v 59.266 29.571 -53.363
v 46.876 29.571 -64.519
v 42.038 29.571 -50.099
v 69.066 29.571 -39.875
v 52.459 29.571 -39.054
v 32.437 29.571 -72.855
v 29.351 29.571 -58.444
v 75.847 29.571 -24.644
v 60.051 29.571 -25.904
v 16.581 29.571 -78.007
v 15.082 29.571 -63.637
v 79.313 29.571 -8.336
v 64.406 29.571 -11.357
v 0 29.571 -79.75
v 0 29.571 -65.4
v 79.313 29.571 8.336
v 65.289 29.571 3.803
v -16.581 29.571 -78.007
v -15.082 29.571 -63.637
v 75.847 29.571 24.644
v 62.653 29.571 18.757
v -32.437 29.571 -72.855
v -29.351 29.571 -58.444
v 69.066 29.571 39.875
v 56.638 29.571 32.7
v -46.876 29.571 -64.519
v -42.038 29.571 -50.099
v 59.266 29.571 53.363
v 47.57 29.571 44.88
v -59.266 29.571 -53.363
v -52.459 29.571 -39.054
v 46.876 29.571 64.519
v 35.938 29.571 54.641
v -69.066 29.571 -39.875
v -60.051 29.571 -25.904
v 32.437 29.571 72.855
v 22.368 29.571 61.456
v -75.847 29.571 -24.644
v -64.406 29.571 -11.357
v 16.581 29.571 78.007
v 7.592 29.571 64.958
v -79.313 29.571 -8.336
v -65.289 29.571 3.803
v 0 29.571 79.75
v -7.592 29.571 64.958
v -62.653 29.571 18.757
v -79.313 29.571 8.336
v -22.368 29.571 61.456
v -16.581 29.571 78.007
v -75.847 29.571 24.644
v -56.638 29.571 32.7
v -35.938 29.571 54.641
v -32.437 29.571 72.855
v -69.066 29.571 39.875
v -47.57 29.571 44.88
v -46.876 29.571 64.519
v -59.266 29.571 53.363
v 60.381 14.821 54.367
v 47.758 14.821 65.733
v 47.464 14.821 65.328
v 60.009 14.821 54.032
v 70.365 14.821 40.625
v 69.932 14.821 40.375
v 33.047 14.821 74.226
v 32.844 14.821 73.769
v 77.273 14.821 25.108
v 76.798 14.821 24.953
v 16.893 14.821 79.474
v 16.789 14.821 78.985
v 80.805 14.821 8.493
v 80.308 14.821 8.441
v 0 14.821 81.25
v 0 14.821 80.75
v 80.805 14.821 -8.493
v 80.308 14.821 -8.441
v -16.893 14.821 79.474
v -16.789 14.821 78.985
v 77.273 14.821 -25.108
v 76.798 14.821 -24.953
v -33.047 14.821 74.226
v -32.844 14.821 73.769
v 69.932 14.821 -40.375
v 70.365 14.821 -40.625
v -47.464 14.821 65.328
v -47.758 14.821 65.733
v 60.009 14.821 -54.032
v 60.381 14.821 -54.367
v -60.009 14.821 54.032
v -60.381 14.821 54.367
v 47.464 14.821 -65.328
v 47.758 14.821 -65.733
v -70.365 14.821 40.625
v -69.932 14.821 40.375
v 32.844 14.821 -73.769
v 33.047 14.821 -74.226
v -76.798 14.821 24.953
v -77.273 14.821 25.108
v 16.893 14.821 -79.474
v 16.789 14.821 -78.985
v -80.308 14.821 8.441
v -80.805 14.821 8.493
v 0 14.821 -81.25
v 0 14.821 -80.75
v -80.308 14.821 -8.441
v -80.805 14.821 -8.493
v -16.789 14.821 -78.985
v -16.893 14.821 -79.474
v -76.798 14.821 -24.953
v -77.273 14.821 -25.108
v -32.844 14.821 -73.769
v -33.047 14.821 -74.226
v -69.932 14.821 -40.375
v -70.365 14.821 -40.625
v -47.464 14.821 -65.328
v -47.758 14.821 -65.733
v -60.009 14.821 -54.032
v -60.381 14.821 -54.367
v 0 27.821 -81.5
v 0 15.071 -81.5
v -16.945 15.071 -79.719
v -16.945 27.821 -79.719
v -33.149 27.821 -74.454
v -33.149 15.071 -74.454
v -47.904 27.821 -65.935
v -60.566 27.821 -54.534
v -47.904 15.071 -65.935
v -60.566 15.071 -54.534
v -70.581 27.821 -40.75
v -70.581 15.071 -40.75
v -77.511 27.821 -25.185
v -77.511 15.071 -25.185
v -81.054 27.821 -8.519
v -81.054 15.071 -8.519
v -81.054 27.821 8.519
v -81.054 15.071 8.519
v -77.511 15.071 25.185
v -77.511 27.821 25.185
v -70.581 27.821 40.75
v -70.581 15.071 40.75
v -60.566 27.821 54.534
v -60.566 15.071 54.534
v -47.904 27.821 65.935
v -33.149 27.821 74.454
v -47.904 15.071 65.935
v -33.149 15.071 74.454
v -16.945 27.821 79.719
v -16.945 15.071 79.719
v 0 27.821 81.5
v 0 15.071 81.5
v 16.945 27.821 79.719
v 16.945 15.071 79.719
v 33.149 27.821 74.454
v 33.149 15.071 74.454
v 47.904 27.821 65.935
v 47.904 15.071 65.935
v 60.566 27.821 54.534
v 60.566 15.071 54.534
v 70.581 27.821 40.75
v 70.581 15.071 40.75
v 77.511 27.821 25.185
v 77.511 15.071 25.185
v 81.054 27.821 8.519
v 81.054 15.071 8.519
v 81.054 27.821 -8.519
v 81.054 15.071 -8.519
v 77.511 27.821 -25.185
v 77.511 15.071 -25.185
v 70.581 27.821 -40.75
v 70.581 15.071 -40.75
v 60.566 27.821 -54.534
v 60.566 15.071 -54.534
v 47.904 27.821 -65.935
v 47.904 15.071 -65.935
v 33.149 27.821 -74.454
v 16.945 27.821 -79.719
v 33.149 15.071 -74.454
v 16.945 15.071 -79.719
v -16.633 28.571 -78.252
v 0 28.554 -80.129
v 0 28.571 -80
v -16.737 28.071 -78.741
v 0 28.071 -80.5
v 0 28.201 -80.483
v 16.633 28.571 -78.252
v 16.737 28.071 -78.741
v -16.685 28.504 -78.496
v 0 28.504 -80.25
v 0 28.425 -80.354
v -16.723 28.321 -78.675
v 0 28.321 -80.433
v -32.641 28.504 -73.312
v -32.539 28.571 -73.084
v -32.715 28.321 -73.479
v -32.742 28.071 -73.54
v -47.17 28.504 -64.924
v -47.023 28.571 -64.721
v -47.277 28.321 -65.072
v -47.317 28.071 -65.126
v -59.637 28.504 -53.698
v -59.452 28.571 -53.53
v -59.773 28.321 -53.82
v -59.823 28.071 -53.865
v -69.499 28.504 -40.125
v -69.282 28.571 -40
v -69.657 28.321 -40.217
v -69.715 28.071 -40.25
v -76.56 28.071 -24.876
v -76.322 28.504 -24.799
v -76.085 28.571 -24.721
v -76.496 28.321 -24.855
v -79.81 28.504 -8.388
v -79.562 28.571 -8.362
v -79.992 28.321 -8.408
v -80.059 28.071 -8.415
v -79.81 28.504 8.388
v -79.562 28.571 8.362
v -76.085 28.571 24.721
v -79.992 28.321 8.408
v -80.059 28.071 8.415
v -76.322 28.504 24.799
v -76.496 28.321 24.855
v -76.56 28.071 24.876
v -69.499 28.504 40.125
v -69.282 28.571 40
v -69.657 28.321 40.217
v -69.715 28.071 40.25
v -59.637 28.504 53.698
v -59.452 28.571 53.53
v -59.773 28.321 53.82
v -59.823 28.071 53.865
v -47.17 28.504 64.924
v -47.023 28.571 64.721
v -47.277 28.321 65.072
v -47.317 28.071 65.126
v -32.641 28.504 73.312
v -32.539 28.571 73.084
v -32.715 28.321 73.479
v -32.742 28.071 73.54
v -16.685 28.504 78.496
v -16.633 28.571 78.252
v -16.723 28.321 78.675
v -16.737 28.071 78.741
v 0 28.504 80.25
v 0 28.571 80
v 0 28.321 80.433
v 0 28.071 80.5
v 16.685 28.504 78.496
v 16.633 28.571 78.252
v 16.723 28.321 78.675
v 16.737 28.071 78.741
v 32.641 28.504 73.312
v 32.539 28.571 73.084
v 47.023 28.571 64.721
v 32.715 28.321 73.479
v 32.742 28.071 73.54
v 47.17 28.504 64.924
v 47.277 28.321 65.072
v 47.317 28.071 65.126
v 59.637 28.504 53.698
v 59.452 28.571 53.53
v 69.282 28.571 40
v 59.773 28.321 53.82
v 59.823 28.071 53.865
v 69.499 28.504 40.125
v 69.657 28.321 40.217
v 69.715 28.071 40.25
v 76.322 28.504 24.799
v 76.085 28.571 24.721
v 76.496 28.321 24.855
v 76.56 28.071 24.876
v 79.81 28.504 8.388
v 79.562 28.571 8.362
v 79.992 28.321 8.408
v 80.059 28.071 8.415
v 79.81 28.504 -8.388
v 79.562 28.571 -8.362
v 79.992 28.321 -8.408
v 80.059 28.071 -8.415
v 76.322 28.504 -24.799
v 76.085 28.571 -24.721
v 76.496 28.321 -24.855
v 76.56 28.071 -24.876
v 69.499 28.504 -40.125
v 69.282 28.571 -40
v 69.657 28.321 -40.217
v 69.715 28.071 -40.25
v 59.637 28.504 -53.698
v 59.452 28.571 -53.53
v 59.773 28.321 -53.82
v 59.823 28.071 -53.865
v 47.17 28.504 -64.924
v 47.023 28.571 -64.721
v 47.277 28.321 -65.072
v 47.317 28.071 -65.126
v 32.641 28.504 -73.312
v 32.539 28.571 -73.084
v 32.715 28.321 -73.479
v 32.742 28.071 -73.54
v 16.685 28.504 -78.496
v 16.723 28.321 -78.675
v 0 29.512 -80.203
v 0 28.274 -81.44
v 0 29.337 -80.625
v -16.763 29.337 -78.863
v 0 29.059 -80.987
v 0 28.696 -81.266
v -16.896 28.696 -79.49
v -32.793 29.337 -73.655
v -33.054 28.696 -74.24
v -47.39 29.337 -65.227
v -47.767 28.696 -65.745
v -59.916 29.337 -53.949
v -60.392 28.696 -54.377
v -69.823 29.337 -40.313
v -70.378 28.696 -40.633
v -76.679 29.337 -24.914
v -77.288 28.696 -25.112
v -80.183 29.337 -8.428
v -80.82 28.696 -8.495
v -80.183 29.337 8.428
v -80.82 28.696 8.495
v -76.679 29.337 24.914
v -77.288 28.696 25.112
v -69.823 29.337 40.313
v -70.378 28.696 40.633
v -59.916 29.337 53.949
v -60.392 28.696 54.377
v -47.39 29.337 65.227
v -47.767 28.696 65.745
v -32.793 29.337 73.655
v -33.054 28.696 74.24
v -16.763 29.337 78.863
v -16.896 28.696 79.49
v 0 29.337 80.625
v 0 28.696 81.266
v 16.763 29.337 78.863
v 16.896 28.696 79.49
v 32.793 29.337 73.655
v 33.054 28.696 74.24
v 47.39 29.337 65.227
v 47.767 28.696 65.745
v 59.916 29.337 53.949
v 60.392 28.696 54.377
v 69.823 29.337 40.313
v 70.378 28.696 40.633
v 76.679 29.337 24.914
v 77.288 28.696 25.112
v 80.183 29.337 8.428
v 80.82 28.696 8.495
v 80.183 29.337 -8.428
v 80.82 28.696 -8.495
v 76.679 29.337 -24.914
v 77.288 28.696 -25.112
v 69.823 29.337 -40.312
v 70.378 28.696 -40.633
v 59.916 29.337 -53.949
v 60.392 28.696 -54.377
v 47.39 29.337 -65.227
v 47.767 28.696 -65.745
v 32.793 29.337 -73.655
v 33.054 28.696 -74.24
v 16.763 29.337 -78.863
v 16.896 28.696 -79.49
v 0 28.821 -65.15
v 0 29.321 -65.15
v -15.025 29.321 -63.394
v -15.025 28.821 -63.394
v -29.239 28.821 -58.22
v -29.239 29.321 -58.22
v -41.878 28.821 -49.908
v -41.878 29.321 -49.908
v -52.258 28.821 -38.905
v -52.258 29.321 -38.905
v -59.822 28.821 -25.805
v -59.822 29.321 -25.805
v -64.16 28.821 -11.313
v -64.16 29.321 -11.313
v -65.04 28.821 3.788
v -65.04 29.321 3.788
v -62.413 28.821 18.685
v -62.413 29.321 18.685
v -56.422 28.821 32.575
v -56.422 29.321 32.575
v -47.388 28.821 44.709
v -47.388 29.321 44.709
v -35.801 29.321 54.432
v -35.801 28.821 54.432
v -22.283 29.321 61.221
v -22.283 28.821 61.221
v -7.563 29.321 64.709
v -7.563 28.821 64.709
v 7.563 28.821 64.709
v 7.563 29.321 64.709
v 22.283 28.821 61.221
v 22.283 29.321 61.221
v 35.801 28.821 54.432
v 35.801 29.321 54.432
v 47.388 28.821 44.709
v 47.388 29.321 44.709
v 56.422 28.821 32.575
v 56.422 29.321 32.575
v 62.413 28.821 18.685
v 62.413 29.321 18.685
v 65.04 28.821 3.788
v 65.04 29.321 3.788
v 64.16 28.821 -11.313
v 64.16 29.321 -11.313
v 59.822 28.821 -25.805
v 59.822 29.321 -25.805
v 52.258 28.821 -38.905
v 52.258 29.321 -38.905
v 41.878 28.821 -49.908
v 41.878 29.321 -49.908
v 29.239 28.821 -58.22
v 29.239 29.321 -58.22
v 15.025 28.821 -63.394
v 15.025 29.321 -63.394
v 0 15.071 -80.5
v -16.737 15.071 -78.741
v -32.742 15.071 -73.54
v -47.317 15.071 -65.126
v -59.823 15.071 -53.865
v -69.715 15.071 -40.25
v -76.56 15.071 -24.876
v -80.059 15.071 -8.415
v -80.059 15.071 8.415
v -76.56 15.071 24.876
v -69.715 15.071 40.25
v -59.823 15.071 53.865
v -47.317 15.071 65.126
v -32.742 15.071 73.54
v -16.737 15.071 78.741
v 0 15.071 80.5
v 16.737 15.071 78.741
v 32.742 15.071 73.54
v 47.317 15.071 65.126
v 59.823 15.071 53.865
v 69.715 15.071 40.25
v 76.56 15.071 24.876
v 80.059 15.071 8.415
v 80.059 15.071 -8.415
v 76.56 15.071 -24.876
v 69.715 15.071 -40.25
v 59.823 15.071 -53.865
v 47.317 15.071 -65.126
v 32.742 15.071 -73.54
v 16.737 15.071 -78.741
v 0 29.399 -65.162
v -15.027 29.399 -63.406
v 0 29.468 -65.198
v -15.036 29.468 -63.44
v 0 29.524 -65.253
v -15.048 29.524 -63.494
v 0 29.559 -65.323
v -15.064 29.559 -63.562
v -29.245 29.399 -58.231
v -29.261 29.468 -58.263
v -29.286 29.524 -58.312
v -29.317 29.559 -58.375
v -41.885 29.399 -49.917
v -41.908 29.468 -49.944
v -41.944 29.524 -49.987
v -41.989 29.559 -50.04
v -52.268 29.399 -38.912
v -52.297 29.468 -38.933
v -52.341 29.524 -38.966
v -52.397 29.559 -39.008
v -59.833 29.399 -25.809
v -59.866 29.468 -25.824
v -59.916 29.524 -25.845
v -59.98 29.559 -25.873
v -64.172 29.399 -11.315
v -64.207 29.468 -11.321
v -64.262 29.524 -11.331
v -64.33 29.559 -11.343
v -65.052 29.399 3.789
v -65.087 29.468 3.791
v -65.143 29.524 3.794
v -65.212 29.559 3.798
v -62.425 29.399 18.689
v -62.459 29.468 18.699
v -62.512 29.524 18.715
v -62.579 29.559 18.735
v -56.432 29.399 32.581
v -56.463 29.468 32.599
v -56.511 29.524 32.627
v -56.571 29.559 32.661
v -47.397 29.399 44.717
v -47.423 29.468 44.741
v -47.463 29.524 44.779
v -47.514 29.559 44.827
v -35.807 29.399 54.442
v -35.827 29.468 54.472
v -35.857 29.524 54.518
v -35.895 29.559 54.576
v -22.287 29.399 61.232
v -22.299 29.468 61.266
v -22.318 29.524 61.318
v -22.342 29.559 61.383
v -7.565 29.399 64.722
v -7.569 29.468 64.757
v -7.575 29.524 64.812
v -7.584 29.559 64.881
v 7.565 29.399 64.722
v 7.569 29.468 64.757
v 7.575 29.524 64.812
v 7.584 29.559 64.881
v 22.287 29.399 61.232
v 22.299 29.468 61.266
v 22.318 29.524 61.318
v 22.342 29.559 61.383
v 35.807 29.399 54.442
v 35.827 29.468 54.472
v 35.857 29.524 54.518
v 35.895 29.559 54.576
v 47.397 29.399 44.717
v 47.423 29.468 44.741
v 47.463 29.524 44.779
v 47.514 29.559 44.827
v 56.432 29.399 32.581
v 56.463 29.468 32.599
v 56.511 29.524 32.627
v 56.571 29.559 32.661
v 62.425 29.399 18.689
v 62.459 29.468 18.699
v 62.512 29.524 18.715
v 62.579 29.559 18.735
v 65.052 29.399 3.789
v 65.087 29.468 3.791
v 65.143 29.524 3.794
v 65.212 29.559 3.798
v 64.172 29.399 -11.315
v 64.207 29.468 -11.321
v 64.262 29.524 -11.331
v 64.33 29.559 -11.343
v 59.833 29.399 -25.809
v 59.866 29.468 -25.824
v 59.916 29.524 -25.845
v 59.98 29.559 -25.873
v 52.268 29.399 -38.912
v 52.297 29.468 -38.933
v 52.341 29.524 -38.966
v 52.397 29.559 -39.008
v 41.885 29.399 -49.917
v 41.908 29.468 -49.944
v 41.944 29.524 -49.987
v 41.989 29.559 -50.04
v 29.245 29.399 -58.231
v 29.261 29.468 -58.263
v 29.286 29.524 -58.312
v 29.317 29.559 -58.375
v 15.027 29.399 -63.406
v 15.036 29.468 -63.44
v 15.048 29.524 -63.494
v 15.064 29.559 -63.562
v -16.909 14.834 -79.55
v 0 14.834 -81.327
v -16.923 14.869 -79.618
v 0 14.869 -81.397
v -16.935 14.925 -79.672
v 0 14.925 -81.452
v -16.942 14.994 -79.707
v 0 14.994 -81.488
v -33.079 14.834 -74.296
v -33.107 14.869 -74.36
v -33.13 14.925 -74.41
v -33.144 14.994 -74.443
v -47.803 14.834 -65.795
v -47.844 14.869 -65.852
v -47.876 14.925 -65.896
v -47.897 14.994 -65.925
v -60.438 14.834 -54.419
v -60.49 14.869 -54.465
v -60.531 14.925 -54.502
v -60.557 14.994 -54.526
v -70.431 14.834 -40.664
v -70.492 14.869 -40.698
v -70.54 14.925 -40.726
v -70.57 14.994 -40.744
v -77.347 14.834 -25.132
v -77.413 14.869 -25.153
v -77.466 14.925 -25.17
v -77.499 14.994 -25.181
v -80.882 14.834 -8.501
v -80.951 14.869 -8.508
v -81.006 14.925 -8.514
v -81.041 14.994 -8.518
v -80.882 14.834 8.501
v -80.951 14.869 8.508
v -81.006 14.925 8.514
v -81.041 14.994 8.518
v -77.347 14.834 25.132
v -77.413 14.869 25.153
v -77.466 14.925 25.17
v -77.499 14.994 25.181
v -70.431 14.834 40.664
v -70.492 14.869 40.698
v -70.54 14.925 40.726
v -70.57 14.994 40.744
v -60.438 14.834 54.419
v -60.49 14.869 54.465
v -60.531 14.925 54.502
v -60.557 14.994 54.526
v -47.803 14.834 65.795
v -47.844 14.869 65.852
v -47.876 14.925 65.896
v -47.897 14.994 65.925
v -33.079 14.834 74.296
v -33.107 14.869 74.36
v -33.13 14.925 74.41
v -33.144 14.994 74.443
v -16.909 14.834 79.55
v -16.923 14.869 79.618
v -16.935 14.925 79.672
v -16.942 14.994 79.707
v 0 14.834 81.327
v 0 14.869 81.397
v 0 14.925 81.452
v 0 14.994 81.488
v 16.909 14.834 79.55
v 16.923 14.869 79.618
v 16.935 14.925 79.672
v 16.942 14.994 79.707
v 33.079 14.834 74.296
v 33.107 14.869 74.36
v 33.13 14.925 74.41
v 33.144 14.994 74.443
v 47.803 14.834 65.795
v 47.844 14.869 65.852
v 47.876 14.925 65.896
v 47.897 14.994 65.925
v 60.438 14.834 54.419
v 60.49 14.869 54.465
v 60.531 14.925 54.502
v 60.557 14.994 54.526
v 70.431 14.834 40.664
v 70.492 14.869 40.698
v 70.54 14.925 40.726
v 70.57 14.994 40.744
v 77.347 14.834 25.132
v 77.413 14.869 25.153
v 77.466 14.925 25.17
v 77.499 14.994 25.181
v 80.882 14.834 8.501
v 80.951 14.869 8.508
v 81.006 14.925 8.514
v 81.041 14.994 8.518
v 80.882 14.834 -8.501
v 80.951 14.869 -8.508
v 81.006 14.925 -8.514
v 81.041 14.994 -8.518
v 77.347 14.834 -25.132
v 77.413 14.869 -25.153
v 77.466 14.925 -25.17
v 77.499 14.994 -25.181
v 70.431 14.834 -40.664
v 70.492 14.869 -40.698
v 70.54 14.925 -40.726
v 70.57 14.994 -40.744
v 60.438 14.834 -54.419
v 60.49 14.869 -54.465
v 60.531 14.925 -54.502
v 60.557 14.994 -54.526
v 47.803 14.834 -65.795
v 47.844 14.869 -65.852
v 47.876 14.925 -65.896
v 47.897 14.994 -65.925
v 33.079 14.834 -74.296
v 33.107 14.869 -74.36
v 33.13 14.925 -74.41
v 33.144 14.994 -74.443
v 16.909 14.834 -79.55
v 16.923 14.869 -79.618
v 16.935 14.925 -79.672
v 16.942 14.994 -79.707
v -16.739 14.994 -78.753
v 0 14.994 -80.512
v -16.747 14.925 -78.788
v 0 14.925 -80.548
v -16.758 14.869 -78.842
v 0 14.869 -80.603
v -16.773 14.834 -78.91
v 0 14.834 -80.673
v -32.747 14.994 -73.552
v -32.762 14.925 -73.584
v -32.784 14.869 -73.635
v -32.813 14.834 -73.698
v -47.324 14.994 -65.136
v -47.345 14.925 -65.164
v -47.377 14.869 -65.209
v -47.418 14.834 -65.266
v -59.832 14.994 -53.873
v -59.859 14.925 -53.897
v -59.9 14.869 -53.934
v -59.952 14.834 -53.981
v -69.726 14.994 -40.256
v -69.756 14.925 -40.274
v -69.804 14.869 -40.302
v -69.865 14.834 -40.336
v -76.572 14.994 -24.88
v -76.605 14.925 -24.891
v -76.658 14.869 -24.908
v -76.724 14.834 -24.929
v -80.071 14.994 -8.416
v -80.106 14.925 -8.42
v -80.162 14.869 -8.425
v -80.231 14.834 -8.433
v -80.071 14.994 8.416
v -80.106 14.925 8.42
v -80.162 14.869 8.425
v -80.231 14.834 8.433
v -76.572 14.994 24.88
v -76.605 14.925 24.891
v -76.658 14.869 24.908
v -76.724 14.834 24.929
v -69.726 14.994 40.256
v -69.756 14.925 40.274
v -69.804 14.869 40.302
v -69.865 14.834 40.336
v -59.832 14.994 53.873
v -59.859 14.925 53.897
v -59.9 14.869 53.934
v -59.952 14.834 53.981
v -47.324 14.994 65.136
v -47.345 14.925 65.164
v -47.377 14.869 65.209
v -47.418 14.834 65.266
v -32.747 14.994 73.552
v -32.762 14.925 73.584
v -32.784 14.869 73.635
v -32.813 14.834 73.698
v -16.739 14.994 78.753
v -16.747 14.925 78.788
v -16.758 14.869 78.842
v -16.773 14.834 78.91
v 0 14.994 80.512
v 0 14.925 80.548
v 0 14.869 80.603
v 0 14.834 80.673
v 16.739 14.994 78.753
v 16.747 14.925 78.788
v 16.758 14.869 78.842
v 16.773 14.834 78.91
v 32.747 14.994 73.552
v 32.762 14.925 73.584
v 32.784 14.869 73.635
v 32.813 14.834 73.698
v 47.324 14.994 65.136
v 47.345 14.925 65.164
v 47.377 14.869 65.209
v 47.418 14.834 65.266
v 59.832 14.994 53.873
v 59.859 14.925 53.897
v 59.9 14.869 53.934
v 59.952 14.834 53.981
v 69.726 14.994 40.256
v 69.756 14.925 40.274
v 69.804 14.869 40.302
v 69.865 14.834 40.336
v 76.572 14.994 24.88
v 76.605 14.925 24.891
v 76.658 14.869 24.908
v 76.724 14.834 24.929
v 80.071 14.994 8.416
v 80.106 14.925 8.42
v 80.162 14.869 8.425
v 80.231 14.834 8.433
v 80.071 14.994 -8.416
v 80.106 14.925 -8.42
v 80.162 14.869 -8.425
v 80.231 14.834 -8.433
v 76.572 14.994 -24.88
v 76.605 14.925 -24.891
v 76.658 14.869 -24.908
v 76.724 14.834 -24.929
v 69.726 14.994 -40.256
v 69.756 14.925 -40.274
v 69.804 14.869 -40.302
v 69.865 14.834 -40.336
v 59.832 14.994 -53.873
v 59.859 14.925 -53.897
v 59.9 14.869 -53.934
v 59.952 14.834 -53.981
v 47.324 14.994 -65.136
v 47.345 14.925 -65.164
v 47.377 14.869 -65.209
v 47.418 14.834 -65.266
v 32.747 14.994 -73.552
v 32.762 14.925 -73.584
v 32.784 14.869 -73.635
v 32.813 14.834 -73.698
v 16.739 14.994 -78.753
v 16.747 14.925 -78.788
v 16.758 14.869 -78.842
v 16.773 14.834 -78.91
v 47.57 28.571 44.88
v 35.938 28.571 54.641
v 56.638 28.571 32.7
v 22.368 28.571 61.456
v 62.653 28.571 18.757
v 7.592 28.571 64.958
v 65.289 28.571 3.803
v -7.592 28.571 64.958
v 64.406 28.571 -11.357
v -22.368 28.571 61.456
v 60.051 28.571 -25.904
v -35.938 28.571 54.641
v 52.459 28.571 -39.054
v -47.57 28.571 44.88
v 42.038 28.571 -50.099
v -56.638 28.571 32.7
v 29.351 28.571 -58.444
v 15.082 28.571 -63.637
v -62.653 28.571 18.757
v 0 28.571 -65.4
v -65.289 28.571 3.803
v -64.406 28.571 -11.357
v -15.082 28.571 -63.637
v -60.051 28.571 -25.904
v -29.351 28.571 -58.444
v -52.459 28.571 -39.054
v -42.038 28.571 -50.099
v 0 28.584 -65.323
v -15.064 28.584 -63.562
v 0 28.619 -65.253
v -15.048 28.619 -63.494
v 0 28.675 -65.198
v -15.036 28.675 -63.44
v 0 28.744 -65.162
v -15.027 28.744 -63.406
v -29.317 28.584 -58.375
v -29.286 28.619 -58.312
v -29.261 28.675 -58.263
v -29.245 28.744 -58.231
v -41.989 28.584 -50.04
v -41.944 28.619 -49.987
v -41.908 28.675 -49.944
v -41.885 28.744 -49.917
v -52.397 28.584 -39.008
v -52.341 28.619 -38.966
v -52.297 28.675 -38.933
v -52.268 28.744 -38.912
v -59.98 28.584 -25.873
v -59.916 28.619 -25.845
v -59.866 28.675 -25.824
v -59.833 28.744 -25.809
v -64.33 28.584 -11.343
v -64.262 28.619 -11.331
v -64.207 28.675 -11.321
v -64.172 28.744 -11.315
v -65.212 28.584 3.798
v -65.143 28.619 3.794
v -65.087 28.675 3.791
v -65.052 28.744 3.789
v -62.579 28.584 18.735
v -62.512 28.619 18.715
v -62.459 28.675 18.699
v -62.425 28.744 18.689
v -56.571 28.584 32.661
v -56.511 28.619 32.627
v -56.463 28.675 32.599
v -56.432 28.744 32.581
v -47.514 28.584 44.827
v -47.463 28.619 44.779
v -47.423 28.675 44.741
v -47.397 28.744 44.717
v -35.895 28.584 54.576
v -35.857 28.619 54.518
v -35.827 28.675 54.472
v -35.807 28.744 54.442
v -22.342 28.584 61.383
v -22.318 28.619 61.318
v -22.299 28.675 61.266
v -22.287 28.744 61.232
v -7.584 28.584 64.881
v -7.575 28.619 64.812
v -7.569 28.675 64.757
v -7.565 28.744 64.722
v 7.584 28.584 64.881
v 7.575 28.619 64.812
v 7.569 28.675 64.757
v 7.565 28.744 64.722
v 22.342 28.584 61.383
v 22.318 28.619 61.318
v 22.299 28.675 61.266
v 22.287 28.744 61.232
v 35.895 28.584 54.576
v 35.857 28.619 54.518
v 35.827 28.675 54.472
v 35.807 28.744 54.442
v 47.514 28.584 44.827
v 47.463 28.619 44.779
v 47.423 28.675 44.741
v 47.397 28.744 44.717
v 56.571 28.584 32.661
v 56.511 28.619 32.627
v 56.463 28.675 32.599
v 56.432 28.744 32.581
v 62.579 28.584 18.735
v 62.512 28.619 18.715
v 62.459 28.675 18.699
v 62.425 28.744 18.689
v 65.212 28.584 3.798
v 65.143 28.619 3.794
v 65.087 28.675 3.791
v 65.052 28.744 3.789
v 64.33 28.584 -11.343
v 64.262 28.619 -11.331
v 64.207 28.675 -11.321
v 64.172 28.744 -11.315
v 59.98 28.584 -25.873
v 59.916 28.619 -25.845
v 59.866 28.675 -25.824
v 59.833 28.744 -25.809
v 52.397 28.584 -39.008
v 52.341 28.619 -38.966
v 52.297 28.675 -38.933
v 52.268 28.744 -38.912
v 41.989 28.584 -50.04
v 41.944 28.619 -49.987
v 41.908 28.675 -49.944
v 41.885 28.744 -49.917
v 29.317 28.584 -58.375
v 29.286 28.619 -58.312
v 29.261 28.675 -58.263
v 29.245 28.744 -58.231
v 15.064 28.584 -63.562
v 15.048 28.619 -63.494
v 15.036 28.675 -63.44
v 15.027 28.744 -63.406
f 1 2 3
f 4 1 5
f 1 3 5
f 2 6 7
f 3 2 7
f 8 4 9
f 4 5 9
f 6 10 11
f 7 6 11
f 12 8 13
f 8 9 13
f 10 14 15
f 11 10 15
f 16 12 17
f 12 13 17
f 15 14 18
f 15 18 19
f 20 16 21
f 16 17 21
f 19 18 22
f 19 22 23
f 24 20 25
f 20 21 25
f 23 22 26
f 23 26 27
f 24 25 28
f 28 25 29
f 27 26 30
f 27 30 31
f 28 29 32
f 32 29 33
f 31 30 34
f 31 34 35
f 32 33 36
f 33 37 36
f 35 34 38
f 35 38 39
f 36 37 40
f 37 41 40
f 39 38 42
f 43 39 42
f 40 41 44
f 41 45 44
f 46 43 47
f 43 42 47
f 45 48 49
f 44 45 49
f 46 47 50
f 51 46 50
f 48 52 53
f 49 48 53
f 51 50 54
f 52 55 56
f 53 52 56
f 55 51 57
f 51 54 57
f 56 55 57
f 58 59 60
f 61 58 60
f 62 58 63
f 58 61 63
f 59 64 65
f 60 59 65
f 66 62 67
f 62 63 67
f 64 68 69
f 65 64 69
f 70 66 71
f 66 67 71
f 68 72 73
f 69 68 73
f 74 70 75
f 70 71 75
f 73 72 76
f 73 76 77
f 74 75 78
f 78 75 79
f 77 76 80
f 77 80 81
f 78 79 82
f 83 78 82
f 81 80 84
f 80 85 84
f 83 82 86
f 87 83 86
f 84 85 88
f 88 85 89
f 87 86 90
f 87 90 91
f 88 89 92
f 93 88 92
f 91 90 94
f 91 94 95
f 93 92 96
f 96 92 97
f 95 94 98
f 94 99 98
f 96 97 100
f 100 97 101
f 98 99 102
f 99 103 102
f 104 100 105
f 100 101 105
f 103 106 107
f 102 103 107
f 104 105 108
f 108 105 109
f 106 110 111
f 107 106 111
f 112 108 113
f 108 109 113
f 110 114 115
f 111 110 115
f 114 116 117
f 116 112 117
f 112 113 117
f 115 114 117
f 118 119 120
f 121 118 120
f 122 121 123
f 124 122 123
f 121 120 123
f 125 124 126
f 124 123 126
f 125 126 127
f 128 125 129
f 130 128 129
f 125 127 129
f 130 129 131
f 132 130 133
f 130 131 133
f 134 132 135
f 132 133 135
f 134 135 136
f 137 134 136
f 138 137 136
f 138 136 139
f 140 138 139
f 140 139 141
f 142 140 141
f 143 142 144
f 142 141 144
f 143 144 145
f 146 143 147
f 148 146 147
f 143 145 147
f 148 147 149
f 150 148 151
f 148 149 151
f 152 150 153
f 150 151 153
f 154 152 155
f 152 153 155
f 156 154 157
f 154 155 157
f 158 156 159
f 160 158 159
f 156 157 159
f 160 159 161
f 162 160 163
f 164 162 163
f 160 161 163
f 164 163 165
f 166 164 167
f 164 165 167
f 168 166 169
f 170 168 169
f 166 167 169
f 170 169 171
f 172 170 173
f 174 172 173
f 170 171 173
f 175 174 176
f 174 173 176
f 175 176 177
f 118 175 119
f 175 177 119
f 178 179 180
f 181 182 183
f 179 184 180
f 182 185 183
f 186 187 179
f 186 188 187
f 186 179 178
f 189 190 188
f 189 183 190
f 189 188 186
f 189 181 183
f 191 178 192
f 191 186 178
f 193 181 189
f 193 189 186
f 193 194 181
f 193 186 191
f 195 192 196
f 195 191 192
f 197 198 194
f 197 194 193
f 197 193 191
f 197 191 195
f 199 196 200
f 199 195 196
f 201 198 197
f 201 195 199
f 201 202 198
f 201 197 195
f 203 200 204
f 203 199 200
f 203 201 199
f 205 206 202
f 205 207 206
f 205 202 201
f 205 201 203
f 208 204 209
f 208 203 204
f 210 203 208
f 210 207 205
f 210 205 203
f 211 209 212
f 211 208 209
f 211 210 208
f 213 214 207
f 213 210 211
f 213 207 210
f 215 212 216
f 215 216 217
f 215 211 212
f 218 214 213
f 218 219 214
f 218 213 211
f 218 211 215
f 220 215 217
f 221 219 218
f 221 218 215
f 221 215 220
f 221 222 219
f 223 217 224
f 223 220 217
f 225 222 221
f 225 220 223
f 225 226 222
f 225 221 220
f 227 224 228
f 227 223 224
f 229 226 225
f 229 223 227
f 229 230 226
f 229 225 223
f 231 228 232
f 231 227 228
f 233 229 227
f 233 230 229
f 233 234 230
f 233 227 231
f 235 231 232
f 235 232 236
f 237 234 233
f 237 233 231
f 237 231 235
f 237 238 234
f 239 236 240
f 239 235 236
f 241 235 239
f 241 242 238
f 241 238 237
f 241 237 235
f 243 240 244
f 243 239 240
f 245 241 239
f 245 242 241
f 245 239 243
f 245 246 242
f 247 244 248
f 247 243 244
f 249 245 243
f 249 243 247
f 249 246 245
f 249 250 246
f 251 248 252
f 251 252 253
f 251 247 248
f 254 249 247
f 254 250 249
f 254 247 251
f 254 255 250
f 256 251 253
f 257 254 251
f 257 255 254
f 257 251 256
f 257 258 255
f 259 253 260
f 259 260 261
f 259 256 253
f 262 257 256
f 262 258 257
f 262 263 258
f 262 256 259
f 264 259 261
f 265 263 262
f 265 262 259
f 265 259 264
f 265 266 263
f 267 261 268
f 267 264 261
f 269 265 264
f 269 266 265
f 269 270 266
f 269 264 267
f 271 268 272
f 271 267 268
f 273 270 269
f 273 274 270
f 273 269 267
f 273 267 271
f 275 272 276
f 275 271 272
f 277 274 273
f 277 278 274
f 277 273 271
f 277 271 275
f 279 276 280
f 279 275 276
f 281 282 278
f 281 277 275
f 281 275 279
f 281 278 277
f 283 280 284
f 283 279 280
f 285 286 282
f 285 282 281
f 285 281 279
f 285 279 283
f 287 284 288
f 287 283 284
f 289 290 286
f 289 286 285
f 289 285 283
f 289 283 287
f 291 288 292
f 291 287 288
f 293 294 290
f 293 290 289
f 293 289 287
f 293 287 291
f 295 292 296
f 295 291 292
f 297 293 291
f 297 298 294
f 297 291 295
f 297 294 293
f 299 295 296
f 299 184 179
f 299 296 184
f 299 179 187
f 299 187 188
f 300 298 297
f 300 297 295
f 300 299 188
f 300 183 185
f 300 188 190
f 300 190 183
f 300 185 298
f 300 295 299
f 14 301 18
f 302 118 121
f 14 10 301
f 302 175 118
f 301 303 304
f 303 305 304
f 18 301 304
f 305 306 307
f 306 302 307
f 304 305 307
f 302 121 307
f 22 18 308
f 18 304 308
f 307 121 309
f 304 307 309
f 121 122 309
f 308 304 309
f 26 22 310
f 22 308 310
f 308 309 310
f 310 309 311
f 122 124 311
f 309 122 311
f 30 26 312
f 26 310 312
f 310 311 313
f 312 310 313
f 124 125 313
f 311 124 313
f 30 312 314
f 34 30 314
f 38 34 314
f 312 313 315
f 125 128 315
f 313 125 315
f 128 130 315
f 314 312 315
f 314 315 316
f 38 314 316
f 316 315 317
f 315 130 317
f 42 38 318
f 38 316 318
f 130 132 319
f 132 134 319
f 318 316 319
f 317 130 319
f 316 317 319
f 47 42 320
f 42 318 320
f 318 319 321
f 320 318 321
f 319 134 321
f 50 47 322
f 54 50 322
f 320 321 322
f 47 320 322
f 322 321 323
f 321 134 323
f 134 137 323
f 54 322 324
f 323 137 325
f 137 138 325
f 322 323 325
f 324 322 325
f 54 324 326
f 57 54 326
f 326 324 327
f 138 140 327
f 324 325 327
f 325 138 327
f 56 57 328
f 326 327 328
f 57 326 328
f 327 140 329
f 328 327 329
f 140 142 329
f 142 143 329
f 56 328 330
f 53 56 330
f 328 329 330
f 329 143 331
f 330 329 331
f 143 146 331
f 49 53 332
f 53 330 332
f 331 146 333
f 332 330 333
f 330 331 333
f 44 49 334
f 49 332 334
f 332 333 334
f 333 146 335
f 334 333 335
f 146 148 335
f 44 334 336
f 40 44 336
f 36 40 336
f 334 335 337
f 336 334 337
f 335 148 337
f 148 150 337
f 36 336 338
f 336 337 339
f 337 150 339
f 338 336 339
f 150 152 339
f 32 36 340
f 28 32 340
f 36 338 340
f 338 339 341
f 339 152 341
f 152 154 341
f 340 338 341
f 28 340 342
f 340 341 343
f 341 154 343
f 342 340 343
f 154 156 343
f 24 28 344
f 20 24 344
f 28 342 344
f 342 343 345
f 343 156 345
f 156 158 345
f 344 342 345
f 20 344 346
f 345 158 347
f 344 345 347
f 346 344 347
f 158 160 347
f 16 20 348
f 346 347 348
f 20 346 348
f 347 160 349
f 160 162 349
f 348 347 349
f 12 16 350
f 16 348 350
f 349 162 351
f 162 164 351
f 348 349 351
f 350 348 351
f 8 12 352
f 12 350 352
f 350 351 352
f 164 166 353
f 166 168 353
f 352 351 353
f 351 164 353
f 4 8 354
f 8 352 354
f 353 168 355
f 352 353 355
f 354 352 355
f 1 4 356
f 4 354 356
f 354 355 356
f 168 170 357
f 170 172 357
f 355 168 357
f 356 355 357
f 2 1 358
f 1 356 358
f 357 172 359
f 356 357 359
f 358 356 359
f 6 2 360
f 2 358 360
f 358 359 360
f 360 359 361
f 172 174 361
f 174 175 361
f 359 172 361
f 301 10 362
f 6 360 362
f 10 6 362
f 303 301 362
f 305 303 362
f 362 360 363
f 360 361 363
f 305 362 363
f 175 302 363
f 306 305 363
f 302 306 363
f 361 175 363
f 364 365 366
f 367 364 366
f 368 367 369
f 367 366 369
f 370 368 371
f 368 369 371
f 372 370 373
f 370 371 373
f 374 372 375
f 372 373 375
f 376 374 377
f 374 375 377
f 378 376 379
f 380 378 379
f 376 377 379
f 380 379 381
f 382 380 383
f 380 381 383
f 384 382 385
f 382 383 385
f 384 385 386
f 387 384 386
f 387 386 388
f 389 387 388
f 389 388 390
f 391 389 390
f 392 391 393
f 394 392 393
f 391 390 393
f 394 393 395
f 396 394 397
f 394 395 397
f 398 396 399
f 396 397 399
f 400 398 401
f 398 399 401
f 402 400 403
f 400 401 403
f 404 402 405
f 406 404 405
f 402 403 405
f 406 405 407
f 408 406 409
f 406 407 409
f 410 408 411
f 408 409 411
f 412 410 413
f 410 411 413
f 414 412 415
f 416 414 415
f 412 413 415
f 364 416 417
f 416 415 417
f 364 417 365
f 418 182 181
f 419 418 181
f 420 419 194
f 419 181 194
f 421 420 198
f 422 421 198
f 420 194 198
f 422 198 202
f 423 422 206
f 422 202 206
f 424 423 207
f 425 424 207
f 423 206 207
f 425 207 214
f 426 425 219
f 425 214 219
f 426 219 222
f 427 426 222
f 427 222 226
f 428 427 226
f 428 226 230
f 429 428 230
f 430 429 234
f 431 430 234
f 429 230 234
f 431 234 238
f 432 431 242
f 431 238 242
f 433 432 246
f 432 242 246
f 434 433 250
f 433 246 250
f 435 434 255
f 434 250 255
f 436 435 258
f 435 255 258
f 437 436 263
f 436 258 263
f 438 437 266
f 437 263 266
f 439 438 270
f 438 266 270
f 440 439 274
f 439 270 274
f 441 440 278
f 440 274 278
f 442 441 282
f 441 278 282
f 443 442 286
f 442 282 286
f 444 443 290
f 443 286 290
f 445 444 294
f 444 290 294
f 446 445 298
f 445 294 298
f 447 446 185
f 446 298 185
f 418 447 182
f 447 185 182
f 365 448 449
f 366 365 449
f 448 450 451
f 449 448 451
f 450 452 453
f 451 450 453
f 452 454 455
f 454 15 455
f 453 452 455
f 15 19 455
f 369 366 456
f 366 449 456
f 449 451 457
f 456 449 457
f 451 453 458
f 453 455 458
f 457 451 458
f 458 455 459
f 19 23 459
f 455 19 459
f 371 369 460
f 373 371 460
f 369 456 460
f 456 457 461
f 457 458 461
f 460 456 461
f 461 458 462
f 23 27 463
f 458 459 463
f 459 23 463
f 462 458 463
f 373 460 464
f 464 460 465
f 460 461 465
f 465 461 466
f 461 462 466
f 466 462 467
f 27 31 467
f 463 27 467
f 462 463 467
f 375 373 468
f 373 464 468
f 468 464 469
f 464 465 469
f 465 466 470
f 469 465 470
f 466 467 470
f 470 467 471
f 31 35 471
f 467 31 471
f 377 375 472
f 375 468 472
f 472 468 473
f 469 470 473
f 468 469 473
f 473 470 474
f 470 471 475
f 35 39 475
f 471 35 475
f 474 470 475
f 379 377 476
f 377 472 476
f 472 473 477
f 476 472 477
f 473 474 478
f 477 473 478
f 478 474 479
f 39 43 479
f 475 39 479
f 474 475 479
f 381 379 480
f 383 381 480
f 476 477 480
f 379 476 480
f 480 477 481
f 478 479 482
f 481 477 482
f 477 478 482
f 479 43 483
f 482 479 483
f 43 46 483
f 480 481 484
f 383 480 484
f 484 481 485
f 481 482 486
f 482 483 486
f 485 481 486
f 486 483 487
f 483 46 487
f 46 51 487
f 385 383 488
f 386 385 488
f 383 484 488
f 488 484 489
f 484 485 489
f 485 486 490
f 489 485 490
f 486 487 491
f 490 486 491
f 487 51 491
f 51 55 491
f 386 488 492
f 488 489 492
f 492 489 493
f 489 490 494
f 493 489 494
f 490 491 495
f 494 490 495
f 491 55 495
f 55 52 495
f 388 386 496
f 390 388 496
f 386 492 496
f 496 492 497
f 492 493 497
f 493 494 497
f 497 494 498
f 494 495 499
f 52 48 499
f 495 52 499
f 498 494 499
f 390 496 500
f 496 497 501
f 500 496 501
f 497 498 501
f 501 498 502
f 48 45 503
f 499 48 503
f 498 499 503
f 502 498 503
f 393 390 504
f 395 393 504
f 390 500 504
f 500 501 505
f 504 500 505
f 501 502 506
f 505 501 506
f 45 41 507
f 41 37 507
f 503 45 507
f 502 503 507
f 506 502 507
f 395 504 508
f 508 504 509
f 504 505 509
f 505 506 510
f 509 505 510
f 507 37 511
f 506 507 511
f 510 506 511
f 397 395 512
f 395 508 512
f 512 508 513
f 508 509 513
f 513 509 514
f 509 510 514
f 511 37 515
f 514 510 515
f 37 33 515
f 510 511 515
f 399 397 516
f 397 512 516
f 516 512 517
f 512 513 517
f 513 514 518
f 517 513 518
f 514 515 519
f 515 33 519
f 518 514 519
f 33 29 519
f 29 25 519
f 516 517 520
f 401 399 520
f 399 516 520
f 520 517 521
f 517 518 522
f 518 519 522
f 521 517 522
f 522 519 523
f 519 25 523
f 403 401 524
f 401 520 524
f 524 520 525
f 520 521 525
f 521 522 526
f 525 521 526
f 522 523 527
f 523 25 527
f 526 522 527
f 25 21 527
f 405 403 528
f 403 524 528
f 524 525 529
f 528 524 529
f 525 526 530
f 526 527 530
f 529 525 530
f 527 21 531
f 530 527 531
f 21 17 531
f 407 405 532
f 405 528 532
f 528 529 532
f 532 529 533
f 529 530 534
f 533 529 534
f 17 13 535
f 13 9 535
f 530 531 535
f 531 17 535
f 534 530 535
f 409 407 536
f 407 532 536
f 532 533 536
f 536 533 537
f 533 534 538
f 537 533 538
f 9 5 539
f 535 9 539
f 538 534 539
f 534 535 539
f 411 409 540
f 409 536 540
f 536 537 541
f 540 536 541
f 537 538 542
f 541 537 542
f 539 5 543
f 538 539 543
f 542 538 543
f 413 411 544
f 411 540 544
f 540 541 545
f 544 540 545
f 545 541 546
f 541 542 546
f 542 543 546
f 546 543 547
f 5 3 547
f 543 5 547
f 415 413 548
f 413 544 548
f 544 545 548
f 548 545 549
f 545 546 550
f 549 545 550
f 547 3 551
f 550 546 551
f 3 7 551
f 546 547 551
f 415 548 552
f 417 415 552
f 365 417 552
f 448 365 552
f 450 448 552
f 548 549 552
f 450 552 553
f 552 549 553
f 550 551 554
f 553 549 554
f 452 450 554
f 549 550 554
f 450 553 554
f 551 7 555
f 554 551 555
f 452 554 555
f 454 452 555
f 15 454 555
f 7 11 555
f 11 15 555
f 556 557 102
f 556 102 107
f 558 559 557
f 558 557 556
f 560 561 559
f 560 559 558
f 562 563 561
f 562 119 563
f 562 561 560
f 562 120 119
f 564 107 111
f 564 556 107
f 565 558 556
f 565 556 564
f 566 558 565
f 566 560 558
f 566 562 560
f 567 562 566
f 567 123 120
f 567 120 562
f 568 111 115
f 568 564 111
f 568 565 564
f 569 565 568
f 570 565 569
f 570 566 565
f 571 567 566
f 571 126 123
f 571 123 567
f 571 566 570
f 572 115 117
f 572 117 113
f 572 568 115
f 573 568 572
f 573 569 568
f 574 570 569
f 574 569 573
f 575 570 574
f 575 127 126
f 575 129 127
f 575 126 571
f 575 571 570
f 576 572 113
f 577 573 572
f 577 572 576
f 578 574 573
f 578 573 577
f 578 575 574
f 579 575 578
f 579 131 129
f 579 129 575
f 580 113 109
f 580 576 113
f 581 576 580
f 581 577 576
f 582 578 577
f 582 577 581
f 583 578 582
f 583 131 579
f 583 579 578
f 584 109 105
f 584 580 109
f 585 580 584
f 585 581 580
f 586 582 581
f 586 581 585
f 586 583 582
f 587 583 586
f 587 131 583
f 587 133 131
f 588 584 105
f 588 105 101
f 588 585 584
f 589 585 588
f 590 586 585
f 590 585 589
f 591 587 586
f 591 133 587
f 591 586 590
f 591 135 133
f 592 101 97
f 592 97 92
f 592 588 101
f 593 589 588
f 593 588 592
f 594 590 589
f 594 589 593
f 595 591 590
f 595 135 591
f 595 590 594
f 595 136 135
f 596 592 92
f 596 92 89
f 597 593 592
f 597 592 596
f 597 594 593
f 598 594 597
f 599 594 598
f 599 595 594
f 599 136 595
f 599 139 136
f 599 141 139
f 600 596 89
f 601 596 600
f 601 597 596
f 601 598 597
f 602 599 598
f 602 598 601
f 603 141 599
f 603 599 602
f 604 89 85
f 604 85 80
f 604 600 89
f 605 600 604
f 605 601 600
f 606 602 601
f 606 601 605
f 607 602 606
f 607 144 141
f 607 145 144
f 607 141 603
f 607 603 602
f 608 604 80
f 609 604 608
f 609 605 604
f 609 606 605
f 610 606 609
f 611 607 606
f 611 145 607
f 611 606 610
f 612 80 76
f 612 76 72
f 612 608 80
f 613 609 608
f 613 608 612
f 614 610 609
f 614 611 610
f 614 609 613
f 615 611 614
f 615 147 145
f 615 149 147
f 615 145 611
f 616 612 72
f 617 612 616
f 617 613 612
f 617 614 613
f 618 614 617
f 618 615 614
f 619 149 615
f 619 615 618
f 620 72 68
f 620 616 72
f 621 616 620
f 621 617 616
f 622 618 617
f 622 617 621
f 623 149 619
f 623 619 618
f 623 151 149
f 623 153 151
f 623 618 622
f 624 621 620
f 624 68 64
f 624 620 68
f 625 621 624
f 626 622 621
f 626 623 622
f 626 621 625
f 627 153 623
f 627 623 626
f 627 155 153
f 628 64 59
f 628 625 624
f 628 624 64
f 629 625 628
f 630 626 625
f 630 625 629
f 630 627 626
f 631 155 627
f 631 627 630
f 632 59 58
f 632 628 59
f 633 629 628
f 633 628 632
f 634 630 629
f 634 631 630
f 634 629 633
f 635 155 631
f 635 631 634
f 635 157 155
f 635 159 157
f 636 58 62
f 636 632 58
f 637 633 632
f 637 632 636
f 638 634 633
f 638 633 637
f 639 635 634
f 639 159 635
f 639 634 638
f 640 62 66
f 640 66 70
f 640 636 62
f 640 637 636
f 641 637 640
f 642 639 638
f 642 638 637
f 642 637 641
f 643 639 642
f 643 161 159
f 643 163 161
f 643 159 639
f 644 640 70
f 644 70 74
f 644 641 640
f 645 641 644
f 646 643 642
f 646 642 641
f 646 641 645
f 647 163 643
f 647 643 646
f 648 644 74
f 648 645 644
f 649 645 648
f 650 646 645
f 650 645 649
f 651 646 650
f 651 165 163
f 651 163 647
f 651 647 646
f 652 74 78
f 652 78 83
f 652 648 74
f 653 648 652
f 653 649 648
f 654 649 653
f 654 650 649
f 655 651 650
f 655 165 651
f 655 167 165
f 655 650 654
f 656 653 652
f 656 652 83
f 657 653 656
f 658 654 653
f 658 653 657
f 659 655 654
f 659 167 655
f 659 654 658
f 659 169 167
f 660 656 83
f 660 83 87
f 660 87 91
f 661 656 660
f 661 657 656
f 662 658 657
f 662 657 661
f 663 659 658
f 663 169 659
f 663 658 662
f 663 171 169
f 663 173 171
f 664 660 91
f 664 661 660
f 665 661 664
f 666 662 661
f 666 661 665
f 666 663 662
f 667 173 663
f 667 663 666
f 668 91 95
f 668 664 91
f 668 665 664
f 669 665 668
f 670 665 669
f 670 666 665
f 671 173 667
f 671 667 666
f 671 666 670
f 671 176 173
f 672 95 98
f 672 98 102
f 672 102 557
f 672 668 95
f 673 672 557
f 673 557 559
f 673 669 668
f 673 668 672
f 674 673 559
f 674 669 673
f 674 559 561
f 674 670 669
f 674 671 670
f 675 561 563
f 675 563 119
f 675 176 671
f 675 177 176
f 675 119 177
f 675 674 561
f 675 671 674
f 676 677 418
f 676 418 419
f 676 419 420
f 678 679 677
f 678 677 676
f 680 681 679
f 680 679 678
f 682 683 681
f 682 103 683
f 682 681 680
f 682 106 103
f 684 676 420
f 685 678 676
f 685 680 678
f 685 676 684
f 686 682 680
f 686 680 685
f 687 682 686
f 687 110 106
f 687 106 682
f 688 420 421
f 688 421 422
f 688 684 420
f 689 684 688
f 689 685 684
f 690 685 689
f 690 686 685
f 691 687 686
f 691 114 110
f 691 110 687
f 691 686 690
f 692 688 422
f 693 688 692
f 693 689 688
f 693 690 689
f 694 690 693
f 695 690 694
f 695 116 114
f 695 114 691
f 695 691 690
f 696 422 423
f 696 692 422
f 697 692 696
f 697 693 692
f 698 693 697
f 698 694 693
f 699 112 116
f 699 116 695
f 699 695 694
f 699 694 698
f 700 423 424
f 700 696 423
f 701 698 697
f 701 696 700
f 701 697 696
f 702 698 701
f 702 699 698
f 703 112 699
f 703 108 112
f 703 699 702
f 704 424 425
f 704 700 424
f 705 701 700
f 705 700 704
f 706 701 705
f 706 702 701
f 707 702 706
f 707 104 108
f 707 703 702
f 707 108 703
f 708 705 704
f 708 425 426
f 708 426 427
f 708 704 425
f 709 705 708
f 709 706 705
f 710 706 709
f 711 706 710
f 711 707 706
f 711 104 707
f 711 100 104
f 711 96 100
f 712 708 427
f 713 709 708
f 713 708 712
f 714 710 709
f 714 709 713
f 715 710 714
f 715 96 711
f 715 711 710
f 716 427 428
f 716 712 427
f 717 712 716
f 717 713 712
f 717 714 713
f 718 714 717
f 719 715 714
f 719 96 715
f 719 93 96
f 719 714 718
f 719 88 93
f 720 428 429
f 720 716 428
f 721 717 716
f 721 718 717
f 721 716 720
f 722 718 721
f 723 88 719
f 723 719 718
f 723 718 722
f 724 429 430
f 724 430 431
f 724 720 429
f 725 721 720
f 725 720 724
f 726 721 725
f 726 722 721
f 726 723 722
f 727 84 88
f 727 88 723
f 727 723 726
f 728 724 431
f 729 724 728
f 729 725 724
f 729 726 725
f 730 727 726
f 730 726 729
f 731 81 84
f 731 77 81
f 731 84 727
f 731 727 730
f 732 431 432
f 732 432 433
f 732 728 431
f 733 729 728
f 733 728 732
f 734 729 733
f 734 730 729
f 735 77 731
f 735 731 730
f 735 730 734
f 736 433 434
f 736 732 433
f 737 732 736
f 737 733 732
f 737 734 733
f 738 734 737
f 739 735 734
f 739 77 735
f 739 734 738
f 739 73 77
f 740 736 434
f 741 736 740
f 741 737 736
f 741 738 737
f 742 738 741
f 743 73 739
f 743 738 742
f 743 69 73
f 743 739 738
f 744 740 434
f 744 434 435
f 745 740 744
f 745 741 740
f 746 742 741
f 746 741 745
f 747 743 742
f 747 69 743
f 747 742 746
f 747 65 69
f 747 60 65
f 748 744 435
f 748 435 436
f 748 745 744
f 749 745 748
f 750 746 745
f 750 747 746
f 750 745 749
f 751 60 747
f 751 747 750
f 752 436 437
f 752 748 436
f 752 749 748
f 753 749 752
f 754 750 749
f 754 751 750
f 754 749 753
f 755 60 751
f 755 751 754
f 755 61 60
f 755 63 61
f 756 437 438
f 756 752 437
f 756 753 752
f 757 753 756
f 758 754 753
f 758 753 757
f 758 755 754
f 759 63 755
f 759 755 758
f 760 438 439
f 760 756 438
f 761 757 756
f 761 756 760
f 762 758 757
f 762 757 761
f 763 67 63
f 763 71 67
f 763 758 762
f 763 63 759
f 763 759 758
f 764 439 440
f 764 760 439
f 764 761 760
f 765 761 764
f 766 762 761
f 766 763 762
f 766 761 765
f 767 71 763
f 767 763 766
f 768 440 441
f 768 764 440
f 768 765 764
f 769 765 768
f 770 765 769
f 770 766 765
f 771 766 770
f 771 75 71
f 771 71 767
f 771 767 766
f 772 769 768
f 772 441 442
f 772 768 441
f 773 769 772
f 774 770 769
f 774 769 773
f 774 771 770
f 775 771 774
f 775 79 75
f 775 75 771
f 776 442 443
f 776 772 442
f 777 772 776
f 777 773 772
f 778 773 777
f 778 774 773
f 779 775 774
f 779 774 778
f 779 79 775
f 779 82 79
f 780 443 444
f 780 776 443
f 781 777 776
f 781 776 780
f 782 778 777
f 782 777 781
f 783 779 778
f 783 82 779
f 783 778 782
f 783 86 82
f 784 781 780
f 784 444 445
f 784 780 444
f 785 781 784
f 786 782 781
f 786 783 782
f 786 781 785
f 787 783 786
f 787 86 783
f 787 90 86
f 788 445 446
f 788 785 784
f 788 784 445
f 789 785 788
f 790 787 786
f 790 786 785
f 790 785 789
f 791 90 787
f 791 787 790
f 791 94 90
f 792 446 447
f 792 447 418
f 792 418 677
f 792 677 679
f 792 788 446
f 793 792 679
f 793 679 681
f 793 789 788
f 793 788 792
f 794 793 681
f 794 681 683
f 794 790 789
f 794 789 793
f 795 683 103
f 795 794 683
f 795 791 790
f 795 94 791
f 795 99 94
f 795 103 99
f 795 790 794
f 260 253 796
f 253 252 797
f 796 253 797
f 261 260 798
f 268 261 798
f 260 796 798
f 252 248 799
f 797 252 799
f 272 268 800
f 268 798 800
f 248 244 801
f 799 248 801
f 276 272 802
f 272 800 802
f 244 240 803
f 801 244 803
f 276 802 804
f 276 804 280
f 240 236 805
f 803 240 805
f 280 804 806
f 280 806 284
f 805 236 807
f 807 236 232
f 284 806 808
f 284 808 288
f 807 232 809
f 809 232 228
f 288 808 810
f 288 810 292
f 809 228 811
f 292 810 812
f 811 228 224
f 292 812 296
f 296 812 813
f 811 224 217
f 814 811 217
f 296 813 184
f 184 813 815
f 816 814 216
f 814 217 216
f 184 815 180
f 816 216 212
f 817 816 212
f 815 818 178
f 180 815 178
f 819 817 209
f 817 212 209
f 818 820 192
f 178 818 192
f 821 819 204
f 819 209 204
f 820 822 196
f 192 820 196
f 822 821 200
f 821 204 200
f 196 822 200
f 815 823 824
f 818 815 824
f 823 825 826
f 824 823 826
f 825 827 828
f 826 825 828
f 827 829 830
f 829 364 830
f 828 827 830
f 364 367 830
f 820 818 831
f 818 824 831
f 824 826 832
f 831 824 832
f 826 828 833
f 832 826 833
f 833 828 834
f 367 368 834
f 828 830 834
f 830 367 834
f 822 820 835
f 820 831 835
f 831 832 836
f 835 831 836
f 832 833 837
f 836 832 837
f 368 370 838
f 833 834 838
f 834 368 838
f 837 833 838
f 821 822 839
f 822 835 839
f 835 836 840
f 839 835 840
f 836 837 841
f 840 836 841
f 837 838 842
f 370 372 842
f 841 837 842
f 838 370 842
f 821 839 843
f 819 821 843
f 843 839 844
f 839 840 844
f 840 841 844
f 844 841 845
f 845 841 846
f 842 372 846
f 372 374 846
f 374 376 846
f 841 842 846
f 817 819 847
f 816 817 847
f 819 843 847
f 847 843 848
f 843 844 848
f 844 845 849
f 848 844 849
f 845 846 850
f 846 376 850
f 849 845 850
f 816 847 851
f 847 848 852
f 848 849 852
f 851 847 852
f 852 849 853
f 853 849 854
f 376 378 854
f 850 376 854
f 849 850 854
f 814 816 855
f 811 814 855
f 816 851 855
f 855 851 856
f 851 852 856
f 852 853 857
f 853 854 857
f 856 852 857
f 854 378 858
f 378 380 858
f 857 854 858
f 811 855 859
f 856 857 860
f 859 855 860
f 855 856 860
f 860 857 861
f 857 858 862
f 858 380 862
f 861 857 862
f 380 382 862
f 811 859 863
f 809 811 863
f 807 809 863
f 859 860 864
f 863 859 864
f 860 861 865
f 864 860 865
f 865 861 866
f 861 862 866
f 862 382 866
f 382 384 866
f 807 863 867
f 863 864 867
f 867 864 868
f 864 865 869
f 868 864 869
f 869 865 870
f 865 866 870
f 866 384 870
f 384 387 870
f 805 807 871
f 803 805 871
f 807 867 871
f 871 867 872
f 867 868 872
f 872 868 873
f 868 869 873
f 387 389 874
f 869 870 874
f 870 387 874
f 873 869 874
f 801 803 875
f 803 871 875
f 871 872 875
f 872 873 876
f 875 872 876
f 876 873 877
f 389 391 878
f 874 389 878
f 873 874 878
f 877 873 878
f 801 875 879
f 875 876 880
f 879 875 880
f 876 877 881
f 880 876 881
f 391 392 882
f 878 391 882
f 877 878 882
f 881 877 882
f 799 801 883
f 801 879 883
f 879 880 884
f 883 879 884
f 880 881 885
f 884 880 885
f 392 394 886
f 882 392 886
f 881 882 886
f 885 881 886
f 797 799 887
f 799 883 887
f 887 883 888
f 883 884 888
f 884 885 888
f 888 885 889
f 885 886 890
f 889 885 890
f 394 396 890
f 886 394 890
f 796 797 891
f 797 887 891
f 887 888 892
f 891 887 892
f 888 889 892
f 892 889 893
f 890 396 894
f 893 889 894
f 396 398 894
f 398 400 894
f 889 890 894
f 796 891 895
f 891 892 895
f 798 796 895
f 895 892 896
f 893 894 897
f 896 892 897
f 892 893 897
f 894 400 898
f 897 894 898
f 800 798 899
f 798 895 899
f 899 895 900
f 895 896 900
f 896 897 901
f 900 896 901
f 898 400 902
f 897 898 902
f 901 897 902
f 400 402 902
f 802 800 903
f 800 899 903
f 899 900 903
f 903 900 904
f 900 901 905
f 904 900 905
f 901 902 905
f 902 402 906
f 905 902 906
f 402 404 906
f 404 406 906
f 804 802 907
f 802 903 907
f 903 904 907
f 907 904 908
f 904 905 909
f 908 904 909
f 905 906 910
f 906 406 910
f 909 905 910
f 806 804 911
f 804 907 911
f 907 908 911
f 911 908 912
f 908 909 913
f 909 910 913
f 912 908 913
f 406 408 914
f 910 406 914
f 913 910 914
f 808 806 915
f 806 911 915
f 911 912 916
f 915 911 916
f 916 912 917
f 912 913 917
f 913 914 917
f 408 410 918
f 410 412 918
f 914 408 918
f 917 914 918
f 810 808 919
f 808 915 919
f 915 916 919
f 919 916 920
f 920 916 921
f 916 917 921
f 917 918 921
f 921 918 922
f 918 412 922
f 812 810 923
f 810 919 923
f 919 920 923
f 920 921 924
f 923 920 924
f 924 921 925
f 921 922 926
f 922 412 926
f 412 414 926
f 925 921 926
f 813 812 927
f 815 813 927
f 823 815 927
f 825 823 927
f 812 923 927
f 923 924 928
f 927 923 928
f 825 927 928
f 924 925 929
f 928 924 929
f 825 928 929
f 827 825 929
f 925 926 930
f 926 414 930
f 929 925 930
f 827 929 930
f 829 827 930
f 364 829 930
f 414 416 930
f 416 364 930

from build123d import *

# Parameters (mm, degrees)
FILETE1_R = 1.75
FILETE2_R = 0.5
FILETE4_R = 0.25


with BuildPart() as part:
    # Esboço1 → Revolução1 (revolve)
    with BuildSketch(Plane.XY, mode=Mode.PRIVATE) as revolu_o1_sk:
        Polygon((65.15, 28.571483942), (65.15, 29.571483942), (81.5, 29.571483942), (81.5, 14.821483942), (80.5, 14.821483942), (80.5, 28.571483942), align=None)
    revolve(revolu_o1_sk.sketch.rotate(Axis((0, -73.042580288, 0), (0, 1, 0)), 90), axis=Axis((0, -73.042580288, 0), (0, 1, 0)))

    # Filete1
    filete1_edges = [part.edges().sort_by_distance(p)[0] for p in [
        (0, 29.571483942, 81.5),
    ]]
    fillet(filete1_edges, radius=FILETE1_R)

    # Filete2
    filete2_edges = [part.edges().sort_by_distance(p)[0] for p in [
        (0, 28.571483942, 80.5),
    ]]
    fillet(filete2_edges, radius=FILETE2_R)

    # Filete4
    filete4_edges = [part.edges().sort_by_distance(p)[0] for p in [
        (0, 14.821483942, 80.5),
        (0, 14.821483942, 81.5),
        (0, 29.571483942, 65.15),
        (0, 28.571483942, 65.15),
    ]]
    fillet(filete4_edges, radius=FILETE4_R)


solid = part.part
